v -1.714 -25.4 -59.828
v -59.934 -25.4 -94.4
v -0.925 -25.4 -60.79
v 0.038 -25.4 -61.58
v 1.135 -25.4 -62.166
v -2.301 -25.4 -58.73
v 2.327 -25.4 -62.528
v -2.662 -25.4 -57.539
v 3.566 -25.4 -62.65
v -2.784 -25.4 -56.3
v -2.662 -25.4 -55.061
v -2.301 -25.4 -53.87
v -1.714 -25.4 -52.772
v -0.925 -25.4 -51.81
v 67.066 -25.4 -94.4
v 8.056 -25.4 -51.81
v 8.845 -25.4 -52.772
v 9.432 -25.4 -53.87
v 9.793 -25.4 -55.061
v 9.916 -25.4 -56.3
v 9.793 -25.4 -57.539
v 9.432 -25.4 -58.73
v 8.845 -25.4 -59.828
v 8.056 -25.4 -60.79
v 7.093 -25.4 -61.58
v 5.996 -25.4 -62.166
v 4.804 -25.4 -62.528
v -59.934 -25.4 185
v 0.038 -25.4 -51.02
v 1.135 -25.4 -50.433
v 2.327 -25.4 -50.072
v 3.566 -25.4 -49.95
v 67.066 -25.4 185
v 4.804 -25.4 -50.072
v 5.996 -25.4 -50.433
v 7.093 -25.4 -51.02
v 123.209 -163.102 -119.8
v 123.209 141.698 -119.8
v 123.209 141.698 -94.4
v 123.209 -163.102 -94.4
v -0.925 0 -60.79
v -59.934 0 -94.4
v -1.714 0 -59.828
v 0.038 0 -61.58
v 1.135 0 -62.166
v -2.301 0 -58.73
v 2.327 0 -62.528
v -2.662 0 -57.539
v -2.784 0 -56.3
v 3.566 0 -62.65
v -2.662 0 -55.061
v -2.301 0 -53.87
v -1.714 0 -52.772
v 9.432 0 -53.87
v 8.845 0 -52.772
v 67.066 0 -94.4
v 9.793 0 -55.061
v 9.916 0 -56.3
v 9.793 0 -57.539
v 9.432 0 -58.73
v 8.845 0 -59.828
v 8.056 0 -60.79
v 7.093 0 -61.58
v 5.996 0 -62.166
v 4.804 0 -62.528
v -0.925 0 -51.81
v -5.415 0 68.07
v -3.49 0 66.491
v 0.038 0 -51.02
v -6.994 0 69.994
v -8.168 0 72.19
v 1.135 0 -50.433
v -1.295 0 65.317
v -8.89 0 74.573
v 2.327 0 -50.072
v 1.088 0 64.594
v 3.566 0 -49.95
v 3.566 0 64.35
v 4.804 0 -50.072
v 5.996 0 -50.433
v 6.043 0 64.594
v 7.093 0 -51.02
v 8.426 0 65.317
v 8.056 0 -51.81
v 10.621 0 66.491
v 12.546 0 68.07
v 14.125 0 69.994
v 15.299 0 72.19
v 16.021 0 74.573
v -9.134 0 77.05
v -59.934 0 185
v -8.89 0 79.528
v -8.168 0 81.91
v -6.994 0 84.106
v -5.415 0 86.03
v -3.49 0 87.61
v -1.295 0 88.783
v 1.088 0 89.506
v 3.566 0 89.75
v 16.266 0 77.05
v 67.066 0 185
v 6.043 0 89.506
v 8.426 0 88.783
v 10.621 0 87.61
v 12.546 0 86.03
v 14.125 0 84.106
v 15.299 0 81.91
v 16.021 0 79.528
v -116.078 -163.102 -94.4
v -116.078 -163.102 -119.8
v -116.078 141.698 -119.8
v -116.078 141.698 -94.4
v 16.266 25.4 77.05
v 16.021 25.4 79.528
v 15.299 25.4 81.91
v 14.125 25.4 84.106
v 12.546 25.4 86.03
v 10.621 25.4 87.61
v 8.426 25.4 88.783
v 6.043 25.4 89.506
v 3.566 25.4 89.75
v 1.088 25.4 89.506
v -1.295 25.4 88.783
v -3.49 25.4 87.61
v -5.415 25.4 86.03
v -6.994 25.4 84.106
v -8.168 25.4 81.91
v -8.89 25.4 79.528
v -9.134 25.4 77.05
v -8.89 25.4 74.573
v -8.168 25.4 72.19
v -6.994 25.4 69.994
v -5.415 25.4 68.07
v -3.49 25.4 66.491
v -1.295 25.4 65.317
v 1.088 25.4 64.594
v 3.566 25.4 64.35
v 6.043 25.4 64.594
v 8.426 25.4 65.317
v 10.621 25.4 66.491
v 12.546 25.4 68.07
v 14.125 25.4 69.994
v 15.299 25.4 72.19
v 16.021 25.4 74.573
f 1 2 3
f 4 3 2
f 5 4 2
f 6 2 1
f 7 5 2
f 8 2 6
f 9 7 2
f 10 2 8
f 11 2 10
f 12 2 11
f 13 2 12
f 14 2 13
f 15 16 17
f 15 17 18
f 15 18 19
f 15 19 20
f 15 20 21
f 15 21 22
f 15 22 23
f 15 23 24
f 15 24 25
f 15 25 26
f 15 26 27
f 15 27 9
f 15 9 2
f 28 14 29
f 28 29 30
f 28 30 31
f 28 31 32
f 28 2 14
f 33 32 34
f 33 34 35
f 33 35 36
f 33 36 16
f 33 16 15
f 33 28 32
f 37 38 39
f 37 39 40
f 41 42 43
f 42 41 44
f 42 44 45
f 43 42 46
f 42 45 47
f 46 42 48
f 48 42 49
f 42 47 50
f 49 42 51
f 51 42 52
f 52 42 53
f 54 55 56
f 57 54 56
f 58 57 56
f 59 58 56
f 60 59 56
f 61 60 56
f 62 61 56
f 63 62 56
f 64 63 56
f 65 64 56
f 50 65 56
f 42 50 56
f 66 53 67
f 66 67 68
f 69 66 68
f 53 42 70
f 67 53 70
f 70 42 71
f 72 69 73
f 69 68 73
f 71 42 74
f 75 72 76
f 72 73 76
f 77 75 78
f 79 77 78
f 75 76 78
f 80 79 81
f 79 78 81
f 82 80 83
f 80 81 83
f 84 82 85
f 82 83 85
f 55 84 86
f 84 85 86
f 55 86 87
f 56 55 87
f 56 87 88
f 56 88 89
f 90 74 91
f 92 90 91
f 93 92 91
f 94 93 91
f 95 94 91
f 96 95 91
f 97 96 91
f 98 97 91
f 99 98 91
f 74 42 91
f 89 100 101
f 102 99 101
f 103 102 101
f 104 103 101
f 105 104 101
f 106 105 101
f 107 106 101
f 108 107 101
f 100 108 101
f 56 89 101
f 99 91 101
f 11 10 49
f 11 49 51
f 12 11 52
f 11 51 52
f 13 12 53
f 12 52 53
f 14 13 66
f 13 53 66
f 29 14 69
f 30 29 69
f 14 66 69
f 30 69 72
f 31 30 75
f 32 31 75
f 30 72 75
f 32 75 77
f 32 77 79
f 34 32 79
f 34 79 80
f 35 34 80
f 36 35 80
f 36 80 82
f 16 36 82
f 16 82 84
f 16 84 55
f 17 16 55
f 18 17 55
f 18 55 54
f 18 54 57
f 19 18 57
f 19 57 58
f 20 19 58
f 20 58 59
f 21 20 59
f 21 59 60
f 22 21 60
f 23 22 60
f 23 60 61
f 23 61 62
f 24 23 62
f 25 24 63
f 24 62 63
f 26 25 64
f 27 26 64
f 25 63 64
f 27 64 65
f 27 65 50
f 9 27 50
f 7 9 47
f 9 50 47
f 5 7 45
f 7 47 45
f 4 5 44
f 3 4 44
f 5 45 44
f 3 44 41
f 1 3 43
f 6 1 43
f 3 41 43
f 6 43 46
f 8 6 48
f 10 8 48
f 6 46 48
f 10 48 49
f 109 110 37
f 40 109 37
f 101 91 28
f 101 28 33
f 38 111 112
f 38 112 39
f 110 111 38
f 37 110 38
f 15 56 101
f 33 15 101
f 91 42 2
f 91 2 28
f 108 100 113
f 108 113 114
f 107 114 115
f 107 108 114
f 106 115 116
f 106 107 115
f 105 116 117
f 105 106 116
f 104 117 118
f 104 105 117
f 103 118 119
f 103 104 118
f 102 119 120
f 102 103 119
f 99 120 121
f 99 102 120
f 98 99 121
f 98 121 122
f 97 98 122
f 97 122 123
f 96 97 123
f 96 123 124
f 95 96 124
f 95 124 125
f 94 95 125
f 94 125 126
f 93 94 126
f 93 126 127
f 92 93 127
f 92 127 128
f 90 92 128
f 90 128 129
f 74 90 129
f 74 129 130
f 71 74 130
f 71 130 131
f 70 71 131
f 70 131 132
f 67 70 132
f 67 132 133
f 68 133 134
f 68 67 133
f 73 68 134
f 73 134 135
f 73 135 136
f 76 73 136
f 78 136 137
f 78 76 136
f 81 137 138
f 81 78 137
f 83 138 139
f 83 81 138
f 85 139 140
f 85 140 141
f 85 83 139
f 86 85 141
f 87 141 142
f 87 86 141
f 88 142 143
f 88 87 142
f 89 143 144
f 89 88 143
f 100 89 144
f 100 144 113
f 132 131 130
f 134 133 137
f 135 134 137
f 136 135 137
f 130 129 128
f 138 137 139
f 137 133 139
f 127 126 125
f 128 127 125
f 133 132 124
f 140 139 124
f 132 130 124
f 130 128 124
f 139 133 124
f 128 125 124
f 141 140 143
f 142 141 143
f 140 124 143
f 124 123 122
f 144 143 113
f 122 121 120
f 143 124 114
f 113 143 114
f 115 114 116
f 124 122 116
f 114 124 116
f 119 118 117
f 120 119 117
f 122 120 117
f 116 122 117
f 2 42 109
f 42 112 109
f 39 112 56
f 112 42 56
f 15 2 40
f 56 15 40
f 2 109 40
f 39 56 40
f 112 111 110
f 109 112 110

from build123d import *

# Parameters (mm, degrees)
F0_W      = 127
F0_H      = 304.8
F1_DEPTH  = 25.4
F2_W      = 239.287932
F2_H      = 304.8
F2_W_2    = 127
F2_H_2    = 25.4
F3_DEPTH  = 25.4
F4_R      = 6.35
F5_DEPTH  = 167.098508
F6_R      = 12.7
F6_R_2    = 6.35
F7_DEPTH  = 32.258
F8_R      = 12.7
F9_DEPTH  = 50.8
F10_R     = 6.35
F11_DEPTH = 78.232


with BuildPart() as f1:
    # F0 (on Front) → F1 (new body)
    with BuildSketch(Plane.XZ):
        with Locations((3.56551, 32.600223)):
            Rectangle(F0_W, F0_H)
    extrude(amount=F1_DEPTH)

    # F2 (on face) → F3 (join)
    with BuildSketch(Plane(origin=(0, 0, -119.799777), x_dir=(1, 0, 0), z_dir=(0, 0, -1))):
        with Locations((3.56551, 10.702492)):
            Rectangle(F2_W, F2_H)
        with Locations((3.56551, 12.7)):
            Rectangle(F2_W_2, F2_H_2, mode=Mode.SUBTRACT)
    extrude(amount=-F3_DEPTH)

    # F4 (on face) → F5 (cut, through all)
    with BuildSketch(Plane.XZ.offset(25.4)):
        with Locations((3.56551, 77.050223)):
            Circle(F4_R)
    extrude(amount=-F5_DEPTH, mode=Mode.SUBTRACT)

    # F6 (on face) → F7 (cut)
    with BuildSketch(Plane(origin=(0, 0, 0), x_dir=(-1, 0, 0), z_dir=(0, 1, 0))):
        with Locations((-3.56551, 77.050223)):
            Circle(F6_R)
        with Locations((-3.56551, 77.050223)):
            Circle(F6_R_2, mode=Mode.SUBTRACT)
    extrude(amount=-F7_DEPTH, mode=Mode.SUBTRACT)

    # F8 (on face) → F9 (join)
    with BuildSketch(Plane.XZ.offset(25.4)):
        with Locations((3.56551, 77.050223)):
            Circle(F8_R)
    extrude(amount=-F9_DEPTH)

    # F10 (on face) → F11 (cut)
    with BuildSketch(Plane(origin=(0, 0, 0), x_dir=(-1, 0, 0), z_dir=(0, 1, 0))):
        with Locations((-3.56551, -56.299777)):
            Circle(F10_R)
    extrude(amount=-F11_DEPTH, mode=Mode.SUBTRACT)


solid = f1.part
